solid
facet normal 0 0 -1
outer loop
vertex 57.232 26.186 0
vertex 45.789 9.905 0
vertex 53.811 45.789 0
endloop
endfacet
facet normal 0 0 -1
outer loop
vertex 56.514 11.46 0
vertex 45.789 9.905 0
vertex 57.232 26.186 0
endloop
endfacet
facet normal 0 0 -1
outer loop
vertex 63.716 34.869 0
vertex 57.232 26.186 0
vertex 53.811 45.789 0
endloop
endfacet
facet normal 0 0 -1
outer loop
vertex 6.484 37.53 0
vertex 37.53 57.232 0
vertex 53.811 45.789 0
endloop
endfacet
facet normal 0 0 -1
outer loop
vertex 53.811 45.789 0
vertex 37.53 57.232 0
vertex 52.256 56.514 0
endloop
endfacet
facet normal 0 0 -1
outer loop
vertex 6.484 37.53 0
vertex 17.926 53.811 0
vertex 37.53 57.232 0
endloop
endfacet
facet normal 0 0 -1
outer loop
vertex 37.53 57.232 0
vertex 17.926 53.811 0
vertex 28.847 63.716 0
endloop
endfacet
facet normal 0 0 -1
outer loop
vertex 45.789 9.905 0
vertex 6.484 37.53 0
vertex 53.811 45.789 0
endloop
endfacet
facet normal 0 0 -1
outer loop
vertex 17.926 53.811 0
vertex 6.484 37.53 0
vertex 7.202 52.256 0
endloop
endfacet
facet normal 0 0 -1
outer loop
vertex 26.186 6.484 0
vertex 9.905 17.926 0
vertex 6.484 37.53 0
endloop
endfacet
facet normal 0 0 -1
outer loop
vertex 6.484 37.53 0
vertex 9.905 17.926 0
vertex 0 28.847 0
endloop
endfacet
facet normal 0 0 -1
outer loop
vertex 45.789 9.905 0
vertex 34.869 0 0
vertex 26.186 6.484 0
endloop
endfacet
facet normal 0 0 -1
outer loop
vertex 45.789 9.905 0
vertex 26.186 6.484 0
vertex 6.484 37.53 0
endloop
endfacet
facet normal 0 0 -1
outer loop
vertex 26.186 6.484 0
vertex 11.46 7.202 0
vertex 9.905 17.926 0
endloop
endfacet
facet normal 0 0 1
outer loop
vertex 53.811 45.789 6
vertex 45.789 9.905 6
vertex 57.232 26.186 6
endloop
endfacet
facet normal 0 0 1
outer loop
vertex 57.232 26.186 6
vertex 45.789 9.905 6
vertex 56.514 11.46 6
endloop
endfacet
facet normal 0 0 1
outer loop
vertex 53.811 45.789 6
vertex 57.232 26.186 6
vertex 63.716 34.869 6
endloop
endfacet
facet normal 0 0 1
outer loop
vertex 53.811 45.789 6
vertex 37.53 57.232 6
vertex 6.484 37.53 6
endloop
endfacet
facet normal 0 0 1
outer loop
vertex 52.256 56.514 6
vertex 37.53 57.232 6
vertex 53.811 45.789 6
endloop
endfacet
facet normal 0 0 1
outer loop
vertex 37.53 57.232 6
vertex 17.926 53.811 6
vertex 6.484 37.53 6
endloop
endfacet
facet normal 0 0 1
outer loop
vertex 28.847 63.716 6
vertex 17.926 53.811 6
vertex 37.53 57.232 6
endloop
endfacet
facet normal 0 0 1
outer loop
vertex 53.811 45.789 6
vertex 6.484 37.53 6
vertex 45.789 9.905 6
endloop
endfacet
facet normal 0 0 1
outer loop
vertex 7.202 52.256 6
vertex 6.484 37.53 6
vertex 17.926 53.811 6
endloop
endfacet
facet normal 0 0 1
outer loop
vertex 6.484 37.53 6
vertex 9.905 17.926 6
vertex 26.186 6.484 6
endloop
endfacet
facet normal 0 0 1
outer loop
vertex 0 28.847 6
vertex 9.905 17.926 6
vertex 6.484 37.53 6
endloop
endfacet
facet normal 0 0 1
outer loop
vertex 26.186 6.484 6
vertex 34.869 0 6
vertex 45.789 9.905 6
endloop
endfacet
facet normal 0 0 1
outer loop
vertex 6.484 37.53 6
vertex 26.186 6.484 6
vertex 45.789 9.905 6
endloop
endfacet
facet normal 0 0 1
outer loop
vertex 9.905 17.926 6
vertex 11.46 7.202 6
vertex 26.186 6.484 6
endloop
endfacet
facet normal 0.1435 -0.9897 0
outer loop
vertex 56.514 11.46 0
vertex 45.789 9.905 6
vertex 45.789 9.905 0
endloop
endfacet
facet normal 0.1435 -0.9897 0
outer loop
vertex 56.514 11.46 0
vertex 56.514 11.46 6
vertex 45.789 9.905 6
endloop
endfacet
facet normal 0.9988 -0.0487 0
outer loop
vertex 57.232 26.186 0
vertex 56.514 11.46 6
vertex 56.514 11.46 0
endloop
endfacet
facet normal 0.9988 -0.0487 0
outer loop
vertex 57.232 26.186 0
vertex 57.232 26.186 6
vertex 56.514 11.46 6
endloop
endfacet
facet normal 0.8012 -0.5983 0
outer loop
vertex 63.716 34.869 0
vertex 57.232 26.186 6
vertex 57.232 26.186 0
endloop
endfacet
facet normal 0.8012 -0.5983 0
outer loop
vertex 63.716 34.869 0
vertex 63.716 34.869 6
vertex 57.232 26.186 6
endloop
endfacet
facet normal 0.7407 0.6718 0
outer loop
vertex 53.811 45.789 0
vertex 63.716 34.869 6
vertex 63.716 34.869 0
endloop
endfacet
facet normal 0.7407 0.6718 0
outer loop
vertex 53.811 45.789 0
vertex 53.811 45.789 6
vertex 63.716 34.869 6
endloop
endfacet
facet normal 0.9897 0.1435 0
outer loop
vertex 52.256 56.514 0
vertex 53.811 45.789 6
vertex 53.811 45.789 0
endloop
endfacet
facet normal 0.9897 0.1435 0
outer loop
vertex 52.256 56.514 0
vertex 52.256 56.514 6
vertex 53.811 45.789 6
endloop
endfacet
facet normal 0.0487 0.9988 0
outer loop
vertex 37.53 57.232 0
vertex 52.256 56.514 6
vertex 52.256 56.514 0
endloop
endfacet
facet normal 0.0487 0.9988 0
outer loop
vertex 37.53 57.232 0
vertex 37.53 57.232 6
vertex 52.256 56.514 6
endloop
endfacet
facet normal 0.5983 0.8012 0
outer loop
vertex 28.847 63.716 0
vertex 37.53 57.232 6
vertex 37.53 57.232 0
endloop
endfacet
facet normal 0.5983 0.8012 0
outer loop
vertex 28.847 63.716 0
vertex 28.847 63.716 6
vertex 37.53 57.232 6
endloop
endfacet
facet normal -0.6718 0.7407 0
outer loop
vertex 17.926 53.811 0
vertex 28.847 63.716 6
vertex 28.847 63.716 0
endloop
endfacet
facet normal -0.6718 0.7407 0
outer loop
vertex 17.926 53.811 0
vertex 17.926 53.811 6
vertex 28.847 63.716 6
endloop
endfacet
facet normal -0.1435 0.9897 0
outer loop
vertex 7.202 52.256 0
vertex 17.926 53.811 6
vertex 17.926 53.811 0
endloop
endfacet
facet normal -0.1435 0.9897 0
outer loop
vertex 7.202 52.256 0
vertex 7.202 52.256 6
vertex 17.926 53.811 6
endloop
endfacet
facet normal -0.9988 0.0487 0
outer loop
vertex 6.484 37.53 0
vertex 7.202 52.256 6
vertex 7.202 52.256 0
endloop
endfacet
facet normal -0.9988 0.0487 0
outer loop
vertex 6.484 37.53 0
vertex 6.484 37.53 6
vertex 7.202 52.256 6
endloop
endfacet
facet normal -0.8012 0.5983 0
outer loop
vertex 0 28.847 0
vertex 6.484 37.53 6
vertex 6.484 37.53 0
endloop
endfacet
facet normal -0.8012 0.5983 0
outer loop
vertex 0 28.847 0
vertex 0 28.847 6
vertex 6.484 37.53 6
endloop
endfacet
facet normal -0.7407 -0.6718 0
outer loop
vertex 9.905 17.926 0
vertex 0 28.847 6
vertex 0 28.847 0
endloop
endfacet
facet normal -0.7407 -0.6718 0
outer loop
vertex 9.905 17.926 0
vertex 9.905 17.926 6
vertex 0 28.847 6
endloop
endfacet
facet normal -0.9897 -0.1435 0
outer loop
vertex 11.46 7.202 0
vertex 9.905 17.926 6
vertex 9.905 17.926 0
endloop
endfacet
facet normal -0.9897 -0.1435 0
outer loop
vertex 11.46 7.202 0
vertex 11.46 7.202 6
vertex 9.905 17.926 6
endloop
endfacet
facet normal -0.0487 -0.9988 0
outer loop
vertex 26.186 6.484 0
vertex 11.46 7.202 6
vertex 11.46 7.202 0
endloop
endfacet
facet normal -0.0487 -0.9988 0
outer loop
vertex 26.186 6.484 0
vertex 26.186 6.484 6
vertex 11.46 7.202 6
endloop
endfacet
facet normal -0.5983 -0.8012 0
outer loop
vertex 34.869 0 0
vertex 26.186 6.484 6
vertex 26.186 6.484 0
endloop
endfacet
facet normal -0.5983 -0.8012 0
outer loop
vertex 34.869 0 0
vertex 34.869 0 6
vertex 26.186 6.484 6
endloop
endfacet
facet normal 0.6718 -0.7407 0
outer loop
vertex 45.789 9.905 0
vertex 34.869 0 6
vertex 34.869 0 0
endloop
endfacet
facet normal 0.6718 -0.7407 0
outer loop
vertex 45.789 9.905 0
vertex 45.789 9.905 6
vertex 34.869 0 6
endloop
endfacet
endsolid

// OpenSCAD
$fn = 32;

// ----------------------------------------------------------------------
// Chain sprocket: 8 teeth, 26 mm root radius
// ----------------------------------------------------------------------

// --- parameters (mm) ---
profile_height = 6;       // extrusion height
profile_points = 16;      // points of the closed outline

profile = [[57.232, 26.186], [63.716, 34.869], [53.811, 45.789], [52.256, 56.514], [37.53, 57.232], [28.847, 63.716], [17.926, 53.811], [7.202, 52.256], [6.484, 37.53], [0, 28.847], [9.905, 17.926], [11.46, 7.202], [26.186, 6.484], [34.869, 0], [45.789, 9.905], [56.514, 11.46]];  // single closed polygon, 16 points, counter clockwise

// --- the one profile operation ---
linear_extrude(height = profile_height) polygon(points = profile);
